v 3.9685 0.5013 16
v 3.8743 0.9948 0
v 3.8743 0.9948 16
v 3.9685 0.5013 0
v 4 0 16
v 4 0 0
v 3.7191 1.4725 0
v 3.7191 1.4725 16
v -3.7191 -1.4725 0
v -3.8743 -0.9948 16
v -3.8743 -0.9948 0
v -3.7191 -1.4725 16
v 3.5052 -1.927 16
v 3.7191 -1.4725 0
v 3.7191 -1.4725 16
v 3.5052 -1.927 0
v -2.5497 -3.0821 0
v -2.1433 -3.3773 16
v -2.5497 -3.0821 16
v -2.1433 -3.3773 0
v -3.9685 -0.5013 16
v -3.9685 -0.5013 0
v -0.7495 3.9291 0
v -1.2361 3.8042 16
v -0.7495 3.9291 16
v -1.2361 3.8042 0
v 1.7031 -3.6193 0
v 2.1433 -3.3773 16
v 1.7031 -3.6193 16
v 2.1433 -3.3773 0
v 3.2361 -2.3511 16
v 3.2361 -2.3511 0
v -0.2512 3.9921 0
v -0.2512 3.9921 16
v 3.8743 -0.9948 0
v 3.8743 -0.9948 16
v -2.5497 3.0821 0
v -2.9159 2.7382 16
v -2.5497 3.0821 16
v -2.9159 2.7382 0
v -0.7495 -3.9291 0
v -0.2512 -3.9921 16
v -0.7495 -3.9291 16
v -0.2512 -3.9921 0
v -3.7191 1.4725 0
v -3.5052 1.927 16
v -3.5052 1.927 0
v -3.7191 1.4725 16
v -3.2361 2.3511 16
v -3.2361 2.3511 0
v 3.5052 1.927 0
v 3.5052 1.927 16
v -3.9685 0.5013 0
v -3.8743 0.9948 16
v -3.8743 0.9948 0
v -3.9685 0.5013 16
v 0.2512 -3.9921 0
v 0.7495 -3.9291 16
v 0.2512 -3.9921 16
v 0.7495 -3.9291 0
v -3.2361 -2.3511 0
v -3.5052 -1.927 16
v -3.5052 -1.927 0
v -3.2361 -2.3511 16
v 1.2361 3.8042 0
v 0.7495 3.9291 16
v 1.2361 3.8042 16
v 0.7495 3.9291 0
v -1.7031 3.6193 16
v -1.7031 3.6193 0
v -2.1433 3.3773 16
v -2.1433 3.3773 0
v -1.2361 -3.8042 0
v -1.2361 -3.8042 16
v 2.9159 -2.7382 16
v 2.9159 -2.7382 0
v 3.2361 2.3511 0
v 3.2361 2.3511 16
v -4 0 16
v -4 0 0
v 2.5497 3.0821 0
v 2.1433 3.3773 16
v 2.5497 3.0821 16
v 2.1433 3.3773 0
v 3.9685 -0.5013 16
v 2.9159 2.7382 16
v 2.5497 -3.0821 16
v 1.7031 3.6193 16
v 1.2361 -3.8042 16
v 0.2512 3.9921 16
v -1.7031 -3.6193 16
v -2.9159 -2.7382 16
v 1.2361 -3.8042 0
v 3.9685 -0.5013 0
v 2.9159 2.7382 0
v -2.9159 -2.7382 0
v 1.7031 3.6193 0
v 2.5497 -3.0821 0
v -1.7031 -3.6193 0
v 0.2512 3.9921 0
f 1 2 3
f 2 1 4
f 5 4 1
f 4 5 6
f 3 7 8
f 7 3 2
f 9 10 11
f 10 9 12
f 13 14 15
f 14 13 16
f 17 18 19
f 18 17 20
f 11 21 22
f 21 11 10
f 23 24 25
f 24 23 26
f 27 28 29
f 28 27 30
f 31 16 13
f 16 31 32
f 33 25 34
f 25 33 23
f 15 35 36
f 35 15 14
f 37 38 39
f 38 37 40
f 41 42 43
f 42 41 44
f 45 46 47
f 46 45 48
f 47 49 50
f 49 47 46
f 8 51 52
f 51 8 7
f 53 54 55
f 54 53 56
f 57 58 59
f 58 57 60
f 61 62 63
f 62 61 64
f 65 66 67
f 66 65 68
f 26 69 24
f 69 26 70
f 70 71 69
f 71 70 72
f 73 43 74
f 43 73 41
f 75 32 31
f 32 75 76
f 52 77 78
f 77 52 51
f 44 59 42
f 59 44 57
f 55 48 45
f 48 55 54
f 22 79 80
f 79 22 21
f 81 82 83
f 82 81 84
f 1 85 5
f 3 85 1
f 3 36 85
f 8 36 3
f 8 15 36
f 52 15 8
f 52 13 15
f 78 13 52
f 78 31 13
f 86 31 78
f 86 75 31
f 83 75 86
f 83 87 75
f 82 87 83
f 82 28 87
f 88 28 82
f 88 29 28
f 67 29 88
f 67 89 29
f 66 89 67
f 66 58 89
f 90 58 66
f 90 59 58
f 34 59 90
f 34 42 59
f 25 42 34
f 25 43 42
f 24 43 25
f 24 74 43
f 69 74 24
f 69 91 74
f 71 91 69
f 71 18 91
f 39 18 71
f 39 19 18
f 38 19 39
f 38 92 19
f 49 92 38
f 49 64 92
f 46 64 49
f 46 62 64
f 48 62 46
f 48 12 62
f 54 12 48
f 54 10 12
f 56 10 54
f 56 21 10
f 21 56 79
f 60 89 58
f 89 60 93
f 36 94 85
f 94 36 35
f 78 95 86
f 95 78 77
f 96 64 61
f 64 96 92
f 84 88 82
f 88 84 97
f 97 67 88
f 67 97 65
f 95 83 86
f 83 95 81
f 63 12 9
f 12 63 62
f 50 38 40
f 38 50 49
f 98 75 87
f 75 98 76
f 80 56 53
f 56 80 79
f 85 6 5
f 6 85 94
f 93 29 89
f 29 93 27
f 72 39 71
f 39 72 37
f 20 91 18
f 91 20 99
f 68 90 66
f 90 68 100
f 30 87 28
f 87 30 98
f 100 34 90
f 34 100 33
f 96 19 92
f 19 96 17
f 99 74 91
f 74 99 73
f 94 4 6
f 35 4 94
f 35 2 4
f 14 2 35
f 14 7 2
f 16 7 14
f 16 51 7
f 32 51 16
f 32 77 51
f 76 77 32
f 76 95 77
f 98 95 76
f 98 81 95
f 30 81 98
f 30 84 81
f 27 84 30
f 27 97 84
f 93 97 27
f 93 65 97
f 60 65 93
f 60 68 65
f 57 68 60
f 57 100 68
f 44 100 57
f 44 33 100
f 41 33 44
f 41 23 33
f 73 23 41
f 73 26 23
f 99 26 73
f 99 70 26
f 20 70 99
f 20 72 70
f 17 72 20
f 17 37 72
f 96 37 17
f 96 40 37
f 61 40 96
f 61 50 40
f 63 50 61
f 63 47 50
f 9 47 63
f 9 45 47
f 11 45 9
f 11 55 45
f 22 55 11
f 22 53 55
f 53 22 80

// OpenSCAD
$fn = 50;

difference() {
	union() {
		cylinder(h = 16, r = 4);
	}
	union();
}
